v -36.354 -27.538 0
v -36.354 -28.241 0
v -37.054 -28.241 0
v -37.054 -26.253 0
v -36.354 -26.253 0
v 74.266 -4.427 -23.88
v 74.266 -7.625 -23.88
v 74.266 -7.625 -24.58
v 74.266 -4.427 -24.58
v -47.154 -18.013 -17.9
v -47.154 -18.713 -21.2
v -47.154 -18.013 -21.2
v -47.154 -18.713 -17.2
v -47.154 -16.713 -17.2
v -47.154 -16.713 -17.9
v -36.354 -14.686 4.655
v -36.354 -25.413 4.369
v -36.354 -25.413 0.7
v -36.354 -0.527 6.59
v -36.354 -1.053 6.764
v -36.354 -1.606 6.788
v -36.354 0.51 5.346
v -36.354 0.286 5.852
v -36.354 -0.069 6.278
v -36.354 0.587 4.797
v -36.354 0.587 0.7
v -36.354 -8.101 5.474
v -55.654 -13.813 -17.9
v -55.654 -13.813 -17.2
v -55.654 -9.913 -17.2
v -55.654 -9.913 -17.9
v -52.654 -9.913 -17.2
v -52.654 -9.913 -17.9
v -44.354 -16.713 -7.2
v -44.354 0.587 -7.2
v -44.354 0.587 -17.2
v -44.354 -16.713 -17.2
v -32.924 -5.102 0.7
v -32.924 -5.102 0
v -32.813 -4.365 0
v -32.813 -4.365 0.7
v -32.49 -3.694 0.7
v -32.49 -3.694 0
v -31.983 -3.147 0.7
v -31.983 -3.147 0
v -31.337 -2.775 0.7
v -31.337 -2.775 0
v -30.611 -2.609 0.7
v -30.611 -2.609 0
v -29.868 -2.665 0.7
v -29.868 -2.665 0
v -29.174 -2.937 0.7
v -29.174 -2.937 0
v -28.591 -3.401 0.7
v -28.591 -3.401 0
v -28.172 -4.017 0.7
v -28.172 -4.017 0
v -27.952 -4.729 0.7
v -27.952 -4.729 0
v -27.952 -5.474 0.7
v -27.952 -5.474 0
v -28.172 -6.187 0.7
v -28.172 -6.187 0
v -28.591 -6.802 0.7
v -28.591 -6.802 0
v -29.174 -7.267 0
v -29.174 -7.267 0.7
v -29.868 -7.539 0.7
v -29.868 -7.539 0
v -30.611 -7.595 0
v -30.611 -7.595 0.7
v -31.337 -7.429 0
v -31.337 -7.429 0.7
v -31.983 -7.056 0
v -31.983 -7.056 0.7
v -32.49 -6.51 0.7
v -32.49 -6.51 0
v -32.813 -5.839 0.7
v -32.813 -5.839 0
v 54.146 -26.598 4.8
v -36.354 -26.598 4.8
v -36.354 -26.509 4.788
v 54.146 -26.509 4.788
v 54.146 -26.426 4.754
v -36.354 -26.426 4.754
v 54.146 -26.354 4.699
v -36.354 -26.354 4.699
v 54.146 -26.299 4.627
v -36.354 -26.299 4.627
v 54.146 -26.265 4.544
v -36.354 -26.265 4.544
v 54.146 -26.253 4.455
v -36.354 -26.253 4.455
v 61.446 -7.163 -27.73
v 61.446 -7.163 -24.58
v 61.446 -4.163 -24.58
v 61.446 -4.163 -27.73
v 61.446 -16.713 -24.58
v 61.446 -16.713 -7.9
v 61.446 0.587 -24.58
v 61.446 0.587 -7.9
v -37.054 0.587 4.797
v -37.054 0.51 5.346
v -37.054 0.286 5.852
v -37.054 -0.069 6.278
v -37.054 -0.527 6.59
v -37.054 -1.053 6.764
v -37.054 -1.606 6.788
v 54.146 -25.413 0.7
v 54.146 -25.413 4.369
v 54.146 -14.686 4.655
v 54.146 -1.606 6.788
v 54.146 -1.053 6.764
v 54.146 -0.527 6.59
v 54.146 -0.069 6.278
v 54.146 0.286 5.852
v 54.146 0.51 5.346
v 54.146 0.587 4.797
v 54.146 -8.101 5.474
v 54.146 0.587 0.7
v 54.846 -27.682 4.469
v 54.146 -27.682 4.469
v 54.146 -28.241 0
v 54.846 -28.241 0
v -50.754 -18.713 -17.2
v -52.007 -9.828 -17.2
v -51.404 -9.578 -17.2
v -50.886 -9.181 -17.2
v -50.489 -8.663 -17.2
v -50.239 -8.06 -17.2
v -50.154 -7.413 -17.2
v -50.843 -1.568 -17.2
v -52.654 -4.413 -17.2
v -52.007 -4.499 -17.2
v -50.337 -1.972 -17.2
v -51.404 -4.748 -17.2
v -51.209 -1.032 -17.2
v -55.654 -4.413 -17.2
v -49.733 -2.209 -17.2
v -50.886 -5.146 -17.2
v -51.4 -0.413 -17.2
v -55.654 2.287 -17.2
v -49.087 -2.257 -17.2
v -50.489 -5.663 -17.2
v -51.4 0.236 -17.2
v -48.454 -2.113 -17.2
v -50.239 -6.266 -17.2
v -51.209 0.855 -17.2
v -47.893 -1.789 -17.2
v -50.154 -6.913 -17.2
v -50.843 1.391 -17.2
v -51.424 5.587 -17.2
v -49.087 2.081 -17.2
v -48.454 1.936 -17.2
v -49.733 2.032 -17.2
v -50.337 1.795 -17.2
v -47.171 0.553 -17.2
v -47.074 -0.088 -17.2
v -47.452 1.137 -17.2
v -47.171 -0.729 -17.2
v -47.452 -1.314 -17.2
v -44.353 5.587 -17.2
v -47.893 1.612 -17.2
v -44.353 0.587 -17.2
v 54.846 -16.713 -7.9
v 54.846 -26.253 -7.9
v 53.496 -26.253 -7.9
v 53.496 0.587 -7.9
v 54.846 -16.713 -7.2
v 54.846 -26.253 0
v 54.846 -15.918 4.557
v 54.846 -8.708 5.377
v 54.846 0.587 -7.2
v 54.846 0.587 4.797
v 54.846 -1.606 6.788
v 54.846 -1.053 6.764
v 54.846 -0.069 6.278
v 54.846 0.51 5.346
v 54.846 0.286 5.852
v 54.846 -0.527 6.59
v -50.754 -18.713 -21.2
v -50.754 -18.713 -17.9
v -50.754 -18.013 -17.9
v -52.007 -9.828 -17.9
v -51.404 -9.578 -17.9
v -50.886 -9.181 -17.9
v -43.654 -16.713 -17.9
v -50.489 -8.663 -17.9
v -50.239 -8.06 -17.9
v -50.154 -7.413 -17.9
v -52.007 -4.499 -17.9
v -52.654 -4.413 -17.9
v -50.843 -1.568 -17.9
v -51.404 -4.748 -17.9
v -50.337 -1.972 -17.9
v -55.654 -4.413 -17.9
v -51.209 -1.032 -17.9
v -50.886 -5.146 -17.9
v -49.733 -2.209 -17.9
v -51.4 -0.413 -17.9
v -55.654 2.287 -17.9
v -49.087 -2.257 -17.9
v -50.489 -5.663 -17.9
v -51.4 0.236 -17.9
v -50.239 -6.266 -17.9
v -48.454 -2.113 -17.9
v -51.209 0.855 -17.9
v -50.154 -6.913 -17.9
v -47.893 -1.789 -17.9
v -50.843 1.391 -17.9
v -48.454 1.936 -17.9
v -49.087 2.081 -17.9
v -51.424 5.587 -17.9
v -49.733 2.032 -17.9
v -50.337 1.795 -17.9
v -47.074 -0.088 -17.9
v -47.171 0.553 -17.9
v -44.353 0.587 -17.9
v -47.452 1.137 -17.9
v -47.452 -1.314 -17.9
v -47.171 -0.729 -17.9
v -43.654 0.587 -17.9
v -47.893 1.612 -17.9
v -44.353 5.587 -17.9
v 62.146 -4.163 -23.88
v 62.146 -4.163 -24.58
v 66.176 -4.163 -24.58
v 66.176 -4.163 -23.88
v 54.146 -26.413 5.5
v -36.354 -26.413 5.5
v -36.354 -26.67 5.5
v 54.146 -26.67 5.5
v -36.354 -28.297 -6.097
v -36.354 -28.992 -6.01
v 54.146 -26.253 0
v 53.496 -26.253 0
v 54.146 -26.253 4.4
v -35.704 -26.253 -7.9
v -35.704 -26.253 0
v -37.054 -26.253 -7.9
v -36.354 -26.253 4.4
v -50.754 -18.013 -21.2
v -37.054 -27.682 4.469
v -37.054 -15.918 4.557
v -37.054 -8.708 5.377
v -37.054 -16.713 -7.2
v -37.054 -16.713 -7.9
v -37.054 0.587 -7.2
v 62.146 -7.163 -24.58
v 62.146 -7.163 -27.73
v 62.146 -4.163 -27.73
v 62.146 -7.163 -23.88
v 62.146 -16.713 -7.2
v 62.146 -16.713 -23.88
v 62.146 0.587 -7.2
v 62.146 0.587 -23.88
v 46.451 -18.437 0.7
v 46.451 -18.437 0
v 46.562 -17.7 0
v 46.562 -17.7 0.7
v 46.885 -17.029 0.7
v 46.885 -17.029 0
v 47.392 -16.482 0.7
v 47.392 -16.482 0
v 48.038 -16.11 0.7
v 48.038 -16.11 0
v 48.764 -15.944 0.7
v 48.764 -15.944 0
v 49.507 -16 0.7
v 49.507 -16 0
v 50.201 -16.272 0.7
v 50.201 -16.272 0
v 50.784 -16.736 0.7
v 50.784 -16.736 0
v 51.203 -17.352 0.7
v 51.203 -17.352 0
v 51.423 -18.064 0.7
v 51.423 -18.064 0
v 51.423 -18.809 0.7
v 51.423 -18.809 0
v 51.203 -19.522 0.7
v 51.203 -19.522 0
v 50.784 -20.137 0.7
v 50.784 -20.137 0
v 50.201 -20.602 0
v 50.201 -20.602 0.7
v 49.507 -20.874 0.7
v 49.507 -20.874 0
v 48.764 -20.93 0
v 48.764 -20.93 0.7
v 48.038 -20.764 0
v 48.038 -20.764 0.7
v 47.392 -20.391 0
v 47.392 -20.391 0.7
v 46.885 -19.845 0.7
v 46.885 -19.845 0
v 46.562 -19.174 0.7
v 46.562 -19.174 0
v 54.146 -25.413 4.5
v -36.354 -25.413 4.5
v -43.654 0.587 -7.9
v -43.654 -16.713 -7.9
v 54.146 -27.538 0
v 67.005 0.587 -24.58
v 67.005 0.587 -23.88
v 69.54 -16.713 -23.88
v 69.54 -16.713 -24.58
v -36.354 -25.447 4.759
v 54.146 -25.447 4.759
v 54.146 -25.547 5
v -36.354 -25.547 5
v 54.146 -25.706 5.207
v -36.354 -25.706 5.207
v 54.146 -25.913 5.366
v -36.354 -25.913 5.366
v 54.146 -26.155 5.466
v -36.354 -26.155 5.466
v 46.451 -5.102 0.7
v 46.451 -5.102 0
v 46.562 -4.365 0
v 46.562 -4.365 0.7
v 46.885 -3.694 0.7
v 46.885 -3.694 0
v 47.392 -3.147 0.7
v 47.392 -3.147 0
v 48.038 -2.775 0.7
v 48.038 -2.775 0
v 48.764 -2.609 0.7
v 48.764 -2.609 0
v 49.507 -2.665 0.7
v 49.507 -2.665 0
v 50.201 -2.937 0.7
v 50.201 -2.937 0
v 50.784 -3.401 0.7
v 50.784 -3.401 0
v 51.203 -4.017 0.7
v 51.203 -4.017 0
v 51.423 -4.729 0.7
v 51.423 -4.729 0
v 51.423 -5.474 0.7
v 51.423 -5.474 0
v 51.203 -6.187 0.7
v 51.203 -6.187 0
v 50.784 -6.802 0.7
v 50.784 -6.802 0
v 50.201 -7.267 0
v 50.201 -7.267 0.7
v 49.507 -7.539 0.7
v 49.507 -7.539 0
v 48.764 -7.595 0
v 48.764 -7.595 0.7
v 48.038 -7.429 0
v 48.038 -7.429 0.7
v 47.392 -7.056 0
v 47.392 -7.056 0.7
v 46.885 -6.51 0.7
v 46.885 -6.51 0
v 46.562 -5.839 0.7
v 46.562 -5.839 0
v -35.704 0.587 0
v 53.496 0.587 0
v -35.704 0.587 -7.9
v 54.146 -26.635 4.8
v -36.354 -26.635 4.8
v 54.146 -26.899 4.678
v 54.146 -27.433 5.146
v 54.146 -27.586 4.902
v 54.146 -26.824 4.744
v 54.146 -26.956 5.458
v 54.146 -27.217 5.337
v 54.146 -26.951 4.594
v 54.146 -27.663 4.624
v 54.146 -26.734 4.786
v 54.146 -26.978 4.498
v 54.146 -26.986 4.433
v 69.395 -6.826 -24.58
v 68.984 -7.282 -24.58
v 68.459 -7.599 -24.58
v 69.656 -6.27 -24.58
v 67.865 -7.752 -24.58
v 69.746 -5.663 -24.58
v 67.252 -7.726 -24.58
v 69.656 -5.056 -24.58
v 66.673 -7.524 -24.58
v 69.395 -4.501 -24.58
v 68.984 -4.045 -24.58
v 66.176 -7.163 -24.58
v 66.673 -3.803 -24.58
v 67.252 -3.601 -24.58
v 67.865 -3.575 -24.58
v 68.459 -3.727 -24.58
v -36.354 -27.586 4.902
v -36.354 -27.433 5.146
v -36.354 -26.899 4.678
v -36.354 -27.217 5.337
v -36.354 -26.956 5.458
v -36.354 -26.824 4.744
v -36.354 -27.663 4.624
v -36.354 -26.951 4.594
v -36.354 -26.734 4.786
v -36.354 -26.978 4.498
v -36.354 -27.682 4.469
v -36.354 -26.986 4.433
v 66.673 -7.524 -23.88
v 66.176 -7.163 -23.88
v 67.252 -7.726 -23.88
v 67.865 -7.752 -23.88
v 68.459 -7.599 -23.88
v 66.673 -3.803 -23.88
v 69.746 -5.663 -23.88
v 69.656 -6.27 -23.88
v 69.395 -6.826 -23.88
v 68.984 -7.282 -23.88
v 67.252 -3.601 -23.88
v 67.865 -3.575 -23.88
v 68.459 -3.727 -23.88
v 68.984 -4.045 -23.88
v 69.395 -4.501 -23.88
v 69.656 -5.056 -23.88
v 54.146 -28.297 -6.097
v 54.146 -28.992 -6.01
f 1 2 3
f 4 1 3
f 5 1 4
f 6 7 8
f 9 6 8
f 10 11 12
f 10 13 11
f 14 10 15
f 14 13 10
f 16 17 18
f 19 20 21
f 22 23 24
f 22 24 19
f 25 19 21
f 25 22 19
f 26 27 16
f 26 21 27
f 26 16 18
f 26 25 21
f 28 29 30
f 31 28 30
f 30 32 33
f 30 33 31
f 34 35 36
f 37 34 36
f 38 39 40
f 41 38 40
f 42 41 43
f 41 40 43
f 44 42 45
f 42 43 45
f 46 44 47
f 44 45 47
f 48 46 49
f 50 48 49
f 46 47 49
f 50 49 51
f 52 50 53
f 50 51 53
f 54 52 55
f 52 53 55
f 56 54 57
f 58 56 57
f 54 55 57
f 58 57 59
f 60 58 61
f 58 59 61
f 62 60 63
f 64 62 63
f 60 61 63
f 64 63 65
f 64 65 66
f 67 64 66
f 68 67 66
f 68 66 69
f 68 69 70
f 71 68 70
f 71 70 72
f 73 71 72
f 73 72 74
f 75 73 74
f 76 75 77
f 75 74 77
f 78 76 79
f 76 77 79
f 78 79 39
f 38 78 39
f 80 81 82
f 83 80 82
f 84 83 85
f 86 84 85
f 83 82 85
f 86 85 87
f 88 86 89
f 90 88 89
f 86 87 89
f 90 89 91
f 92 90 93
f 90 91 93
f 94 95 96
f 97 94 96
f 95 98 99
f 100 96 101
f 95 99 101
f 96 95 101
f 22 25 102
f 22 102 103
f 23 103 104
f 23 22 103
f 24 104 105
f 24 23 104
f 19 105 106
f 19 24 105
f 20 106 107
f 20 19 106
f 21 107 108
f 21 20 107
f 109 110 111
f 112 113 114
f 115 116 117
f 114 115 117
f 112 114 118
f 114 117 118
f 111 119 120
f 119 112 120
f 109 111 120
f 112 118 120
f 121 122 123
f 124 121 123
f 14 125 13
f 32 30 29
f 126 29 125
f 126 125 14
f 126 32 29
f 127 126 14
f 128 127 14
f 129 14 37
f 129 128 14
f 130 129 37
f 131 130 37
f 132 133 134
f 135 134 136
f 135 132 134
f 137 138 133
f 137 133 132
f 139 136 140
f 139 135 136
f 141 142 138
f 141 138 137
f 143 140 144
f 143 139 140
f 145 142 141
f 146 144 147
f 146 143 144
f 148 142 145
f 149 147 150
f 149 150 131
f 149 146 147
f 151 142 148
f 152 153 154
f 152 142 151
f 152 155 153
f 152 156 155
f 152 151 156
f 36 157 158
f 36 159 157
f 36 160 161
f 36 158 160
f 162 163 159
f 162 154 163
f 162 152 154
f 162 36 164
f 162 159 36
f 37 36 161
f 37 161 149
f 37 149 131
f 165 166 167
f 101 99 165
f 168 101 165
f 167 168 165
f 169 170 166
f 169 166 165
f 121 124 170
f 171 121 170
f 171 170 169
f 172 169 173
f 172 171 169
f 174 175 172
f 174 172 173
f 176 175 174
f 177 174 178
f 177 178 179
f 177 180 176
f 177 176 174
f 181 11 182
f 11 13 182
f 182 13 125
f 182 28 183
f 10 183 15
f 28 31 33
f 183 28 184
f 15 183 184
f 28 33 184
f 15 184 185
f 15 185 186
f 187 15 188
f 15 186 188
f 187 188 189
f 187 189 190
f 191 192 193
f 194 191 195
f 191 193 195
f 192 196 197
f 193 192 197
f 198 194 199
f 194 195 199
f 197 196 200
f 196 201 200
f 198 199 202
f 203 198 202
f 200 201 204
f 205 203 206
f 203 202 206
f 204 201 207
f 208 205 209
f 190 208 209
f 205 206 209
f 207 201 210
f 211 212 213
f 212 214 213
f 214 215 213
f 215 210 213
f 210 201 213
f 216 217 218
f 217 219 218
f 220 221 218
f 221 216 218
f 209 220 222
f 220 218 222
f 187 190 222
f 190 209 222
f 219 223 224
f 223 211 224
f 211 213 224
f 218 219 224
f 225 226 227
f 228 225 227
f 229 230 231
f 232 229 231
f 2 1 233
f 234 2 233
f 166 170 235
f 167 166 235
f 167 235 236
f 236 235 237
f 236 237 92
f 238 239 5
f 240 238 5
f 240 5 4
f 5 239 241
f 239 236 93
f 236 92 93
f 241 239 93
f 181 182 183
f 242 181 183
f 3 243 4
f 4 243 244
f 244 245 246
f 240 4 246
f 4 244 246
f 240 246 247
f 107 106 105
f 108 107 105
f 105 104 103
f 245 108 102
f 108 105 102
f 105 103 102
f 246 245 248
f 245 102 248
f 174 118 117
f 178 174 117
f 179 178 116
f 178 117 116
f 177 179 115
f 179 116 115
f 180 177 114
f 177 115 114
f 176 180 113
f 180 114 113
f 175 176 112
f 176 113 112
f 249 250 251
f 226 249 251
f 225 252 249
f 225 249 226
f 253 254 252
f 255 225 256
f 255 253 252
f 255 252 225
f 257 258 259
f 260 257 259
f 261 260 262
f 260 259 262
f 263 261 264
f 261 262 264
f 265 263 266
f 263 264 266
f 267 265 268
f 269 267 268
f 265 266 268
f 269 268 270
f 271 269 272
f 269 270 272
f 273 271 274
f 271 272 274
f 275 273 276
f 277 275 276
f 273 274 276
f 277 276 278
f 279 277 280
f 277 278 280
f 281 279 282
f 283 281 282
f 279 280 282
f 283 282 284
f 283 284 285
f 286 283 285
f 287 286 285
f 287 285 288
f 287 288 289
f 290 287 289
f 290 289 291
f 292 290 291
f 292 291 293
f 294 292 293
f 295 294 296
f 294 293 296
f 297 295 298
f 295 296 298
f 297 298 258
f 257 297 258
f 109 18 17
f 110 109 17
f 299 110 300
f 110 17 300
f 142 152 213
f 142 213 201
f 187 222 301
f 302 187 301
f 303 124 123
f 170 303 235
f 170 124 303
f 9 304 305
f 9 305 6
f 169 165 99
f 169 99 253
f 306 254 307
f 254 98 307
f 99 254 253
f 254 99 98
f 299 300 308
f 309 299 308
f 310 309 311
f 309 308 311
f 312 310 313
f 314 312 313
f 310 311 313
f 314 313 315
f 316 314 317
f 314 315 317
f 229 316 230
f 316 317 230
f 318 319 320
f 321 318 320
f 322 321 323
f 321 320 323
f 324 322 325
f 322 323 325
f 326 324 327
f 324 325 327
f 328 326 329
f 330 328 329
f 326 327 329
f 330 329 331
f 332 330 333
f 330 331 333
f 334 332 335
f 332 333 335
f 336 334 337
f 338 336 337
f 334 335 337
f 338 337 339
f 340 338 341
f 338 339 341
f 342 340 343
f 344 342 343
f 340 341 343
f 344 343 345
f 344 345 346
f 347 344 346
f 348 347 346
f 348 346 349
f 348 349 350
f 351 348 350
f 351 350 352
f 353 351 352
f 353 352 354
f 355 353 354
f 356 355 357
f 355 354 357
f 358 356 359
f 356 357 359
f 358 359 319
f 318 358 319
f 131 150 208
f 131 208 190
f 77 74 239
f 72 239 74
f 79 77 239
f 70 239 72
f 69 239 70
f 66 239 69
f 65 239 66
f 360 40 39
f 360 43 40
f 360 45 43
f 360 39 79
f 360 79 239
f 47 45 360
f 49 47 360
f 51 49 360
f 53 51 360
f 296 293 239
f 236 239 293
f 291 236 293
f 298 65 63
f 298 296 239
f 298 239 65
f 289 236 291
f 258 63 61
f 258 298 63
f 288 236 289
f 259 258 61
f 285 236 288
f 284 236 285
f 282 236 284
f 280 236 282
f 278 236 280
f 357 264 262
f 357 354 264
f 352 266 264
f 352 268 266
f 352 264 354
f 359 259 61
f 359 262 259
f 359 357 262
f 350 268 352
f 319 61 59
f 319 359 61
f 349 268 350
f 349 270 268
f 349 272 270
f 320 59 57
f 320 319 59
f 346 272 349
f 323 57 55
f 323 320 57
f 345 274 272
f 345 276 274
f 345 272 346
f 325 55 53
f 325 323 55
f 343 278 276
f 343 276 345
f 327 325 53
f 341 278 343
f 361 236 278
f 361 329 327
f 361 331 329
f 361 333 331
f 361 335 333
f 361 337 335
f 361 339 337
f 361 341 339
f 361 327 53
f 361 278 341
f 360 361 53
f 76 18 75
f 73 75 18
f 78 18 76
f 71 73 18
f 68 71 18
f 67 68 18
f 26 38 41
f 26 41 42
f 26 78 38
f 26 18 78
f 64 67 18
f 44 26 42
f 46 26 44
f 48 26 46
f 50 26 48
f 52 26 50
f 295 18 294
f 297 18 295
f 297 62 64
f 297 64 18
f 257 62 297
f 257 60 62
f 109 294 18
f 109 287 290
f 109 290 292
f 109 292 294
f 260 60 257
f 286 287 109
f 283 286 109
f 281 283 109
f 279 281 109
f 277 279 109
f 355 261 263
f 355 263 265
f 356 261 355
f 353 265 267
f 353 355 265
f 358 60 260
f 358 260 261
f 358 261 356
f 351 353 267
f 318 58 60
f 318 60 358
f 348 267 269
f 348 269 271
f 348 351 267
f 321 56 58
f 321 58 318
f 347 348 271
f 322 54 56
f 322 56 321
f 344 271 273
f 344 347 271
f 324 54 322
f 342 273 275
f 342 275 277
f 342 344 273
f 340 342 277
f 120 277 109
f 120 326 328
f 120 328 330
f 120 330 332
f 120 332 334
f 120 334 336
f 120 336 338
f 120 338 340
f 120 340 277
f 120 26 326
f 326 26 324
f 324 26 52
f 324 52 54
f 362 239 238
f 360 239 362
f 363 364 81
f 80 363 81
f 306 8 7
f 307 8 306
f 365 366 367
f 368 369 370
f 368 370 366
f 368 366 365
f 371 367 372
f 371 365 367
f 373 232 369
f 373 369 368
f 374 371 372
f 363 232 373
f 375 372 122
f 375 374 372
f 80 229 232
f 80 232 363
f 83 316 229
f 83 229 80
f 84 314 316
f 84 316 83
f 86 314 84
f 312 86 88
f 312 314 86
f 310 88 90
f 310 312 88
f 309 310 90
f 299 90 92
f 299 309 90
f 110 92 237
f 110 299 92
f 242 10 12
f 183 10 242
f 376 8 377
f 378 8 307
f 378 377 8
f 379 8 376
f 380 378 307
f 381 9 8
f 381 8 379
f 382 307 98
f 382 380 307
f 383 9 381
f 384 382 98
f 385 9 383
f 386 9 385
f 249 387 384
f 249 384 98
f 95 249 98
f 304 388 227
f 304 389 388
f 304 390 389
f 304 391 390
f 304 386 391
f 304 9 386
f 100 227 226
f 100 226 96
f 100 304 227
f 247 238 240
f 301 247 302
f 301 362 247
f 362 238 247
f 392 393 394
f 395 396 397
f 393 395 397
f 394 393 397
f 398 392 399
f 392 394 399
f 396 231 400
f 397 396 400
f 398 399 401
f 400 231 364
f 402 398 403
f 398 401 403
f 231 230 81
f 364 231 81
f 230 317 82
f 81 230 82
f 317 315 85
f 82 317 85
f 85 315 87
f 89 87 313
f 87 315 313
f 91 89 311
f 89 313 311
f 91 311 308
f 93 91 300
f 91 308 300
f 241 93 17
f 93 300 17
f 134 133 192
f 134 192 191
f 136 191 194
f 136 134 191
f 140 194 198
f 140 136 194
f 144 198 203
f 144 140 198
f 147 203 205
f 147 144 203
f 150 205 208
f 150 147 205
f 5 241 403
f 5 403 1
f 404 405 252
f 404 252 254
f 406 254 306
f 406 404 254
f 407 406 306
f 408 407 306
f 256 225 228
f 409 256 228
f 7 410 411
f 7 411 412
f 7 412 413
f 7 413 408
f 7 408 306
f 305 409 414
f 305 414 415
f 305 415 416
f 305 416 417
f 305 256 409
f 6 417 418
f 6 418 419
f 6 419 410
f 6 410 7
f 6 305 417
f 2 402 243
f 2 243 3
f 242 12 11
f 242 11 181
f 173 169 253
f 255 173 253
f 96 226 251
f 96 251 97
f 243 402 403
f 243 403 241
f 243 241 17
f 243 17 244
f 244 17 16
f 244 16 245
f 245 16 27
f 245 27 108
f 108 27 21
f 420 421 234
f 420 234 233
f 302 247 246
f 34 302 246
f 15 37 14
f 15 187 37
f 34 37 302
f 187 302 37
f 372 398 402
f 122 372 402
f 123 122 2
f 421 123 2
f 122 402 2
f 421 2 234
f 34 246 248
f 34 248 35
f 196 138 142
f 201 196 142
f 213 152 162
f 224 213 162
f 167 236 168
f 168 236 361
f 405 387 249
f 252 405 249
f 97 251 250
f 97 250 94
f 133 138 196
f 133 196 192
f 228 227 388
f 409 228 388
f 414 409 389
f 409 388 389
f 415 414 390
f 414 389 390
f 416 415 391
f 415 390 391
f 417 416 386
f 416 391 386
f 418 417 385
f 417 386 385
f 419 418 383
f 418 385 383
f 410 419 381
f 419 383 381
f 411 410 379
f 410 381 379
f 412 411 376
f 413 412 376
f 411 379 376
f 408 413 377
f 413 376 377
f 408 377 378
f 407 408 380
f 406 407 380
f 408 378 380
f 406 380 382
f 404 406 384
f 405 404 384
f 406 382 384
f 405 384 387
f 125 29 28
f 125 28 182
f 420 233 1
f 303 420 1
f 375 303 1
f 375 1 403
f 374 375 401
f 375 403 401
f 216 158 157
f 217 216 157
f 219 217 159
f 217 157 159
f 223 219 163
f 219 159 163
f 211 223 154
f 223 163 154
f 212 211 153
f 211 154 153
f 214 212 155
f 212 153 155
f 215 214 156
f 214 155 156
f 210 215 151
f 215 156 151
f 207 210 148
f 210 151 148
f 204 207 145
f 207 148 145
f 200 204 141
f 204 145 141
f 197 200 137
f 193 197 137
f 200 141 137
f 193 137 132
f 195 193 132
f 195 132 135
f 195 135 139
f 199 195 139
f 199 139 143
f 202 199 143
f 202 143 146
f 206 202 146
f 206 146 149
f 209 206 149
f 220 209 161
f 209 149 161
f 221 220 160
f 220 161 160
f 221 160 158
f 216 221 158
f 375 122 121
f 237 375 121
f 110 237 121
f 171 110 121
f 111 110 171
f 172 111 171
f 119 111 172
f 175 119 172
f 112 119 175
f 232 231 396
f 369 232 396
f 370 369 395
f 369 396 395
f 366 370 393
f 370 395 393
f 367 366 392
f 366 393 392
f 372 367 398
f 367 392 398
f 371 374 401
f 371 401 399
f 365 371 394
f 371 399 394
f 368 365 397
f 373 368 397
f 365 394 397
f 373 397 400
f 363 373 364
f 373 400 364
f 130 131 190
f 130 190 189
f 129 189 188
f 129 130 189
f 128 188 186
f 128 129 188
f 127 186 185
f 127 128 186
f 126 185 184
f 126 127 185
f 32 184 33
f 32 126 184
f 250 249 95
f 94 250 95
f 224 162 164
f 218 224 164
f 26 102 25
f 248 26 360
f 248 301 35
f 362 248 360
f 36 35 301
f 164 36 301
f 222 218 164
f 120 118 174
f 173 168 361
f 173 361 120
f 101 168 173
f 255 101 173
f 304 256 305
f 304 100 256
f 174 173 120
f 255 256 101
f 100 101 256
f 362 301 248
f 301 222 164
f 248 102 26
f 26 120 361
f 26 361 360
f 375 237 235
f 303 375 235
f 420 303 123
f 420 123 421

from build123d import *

# Parameters (mm, degrees)
SZKIC1_W                     = 90.5
SZKIC1_H                     = 26
DODANIE_WYCI_GNI_CIE1_DEPTH  = 0.7
DODANIE_WYCI_GNI_CIE2_DEPTH  = 90.5
DODANIE_WYCI_GNI_CIE3_DEPTH  = 0.7
DODANIE_WYCI_GNI_CIE4_DEPTH  = 0.7
SZKIC9_W                     = 1.35
SZKIC9_H                     = 26.839634362
DODANIE_WYCI_GNI_CIE5_DEPTH  = 7.9
DODANIE_WYCI_GNI_CIE6_DEPTH  = 17.3
DODANIE_WYCI_GNI_CIE7_DEPTH  = 17.3
WYTNIJ_WYCI_GNI_CIE1_START   = -0.7
WYTNIJ_WYCI_GNI_CIE1_DEPTH   = 0.7
SZKIC14_W                    = 0.7
SZKIC14_H                    = 3
DODANIE_WYCI_GNI_CIE8_DEPTH  = 3.15
DODANIE_WYCI_GNI_CIE9_DEPTH  = 0.7
SZKIC18_R                    = 2.175
WYTNIJ_WYCI_GNI_CIE2_DEPTH   = 0.7
SZKIC19_W                    = 8.5
SZKIC19_H                    = 2
DODANIE_WYCI_GNI_CIE10_DEPTH = 0.7
WYTNIJ_WYCI_GNI_CIE3_DEPTH   = 0.7
SZKIC22_W                    = 3.6
SZKIC22_H                    = 0.7
DODANIE_WYCI_GNI_CIE11_DEPTH = 3.3
SZKIC23_R                    = 2.5
WYTNIJ_WYCI_GNI_CIE4_DEPTH   = 0.7


with BuildPart() as part:
    # Szkic1 → Dodanie-wyciągnięcie1 (new body)
    with BuildSketch(Plane.XY):
        with Locations((8.895925444, -12.413393351)):
            Rectangle(SZKIC1_W, SZKIC1_H)
    extrude(amount=DODANIE_WYCI_GNI_CIE1_DEPTH)



with BuildPart() as body_2:
    # Szkic3 → Dodanie-wyciągnięcie2 (new body)
    with BuildSketch(Plane.ZY.offset(36.354074556)):
        with BuildLine():
            Line((5.5, -26.413393351), (5.5, -26.670245495))
            ThreePointArc((5.5, -26.670245495), (5.249678176, -27.332048058), (4.624034735, -27.662523372))
            Line((4.624034735, -27.662523372), (-6.01042337, -28.991830635))
            Line((-6.01042337, -28.991830635), (-6.097247684, -28.297236121))
            Line((-6.097247684, -28.297236121), (4.497633639, -26.977852669))
            ThreePointArc((4.497633639, -26.977852669), (4.713586161, -26.863878738), (4.8, -26.635497046))
            Line((4.8, -26.635497046), (4.8, -26.598027713))
            ThreePointArc((4.8, -26.598027713), (4.69895184, -26.354075874), (4.455, -26.253027713))
            Line((4.455, -26.253027713), (0, -26.253027713))
            Line((0, -26.253027713), (0, -25.413393351))
            Line((0, -25.413393351), (4.5, -25.413393351))
            ThreePointArc((4.5, -25.413393351), (5.207106781, -25.706286569), (5.5, -26.413393351))
        make_face()
    extrude(amount=-DODANIE_WYCI_GNI_CIE2_DEPTH)


with BuildPart() as part_1:
    add(part.part)

    add(body_2.part)  # Dodanie-wyciągnięcie3 merges body 2
    # Szkic4 → Dodanie-wyciągnięcie3 (add)
    with BuildSketch(Plane(origin=(54.145925444, 0, 0), x_dir=(0, 0, -1), z_dir=(1, 0, 0))):
        with BuildLine():
            Line((0, 0.586606649), (-4.796894469, 0.586606649))
            ThreePointArc((-4.796894469, 0.586606649), (-6.277718772, -0.069087068), (-6.787575884, -1.606233969))
            add(Edge.make_bspline(
                [(-4.469267418, -27.681869286), (-4.44254495, -27.204916247), (-4.010367743, -18.290006756), (-4.851145038, -9.610716303), (-6.787575884, -1.606233969)],
                knots=[-0.045928805, -0.045928805, -0.045928805, -0.045928805, 0, 0.813756029, 0.813756029, 0.813756029, 0.813756029], degree=3))
            Line((-4.469267418, -27.681869286), (0, -28.240527713))
            Line((0, -28.240527713), (0, 0.586606649))
        make_face()
    extrude(amount=DODANIE_WYCI_GNI_CIE3_DEPTH)

    # Szkic8 → Dodanie-wyciągnięcie4 (add)
    with BuildSketch(Plane.ZY.offset(36.354074556)):
        with BuildLine():
            Line((4.469267418, -27.681869286), (0, -28.240527713))
            Line((0, -28.240527713), (0, 0.586606649))
            Line((0, 0.586606649), (4.796894469, 0.586606649))
            ThreePointArc((4.796894469, 0.586606649), (6.277718772, -0.069087068), (6.787575884, -1.606233969))
            add(Edge.make_bspline(
                [(4.469267418, -27.681869286), (4.44254495, -27.204916247), (4.010367743, -18.290006756), (4.851145038, -9.610716303), (6.787575884, -1.606233969)],
                knots=[-0.045928805, -0.045928805, -0.045928805, -0.045928805, 0, 0.813756029, 0.813756029, 0.813756029, 0.813756029], degree=3))
        make_face()
    extrude(amount=DODANIE_WYCI_GNI_CIE4_DEPTH)

    # Szkic9 → Dodanie-wyciągnięcie5 (add)
    with BuildSketch(Plane(origin=(0, 0, 0), x_dir=(-1, 0, 0), z_dir=(0, 0, -1))):
        with Locations((-54.170925444, -12.833210532)):
            Rectangle(SZKIC9_W, SZKIC9_H)
        with Locations((36.379074556, -12.833210532)):
            Rectangle(SZKIC9_W, SZKIC9_H)
    extrude(amount=DODANIE_WYCI_GNI_CIE5_DEPTH)

    # Szkic11 → Dodanie-wyciągnięcie6 (add)
    with BuildSketch(Plane(origin=(0, 0.586606649, 0), x_dir=(1, 0, 0), z_dir=(0, 1, 0))):
        Polygon((-37.054074556, 7.9), (-37.054074556, 7.2), (-44.354074556, 7.2), (-44.354074556, 17.2), (-55.654074556, 17.2), (-55.654074556, 17.9), (-43.654074556, 17.9), (-43.654074556, 7.9), align=None)
    extrude(amount=-DODANIE_WYCI_GNI_CIE6_DEPTH)

    # Szkic12 → Dodanie-wyciągnięcie7 (add)
    with BuildSketch(Plane(origin=(0, 0.586606649, 0), x_dir=(1, 0, 0), z_dir=(0, 1, 0))):
        Polygon((54.845925444, 7.9), (54.845925444, 7.2), (62.145925444, 7.2), (62.145925444, 23.88), (74.265925444, 23.88), (74.265925444, 24.58), (61.445925444, 24.58), (61.445925444, 7.9), align=None)
    extrude(amount=-DODANIE_WYCI_GNI_CIE7_DEPTH)

    # Szkic13 → Wytnij-wyciągnięcie1 (cut)
    with BuildSketch(Plane.XY.offset(-23.88).offset(WYTNIJ_WYCI_GNI_CIE1_START)):
        Polygon((67.004736449, 0.586606649), (75.489507901, -5.272079996), (69.539548838, -16.713393351), (76.249870064, -16.713393351), (76.249870064, 0.586606649), align=None)
        with BuildLine():
            Line((62.145925444, -4.163393351), (66.176231598, -4.163393351))
            ThreePointArc((66.176231598, -4.163393351), (69.745925444, -5.663393351), (66.176231598, -7.163393351))
            Line((66.176231598, -7.163393351), (62.145925444, -7.163393351))
            Line((62.145925444, -7.163393351), (62.145925444, -4.163393351))
        make_face()
    extrude(amount=WYTNIJ_WYCI_GNI_CIE1_DEPTH, mode=Mode.SUBTRACT)

    # Szkic14 → Dodanie-wyciągnięcie8 (add)
    with BuildSketch(Plane(origin=(0, 0, -24.58), x_dir=(-1, 0, 0), z_dir=(0, 0, -1))):
        with Locations((-61.795925444, -5.663393351)):
            Rectangle(SZKIC14_W, SZKIC14_H)
    extrude(amount=DODANIE_WYCI_GNI_CIE8_DEPTH)

    # Szkic17 → Dodanie-wyciągnięcie9 (add)
    with BuildSketch(Plane.XY.offset(-17.2)):
        Polygon((-44.353275943, 0.54213061), (-55.654074556, 0.586606649), (-55.654074556, 5.586606649), (-44.353275943, 5.586606649), align=None)
    extrude(amount=-DODANIE_WYCI_GNI_CIE9_DEPTH)

    # Szkic18 → Wytnij-wyciągnięcie2 (cut)
    with BuildSketch(Plane.XY.offset(-17.2)):
        with Locations((-49.249074556, -0.088393351)):
            Circle(SZKIC18_R)
        Polygon((-51.424074556, 5.586606649), (-55.654074556, 2.286606649), (-55.654074556, 5.586606649), align=None)
        with BuildLine():
            Line((-55.654074556, -4.413393351), (-52.654074556, -4.413393351))
            ThreePointArc((-52.654074556, -4.413393351), (-50.886307603, -5.145626398), (-50.154074556, -6.913393351))
            Line((-50.154074556, -6.913393351), (-50.154074556, -7.413393351))
            ThreePointArc((-50.154074556, -7.413393351), (-50.886307603, -9.181160304), (-52.654074556, -9.913393351))
            Line((-52.654074556, -9.913393351), (-55.654074556, -9.913393351))
            Line((-55.654074556, -9.913393351), (-55.654074556, -4.413393351))
        make_face()
    extrude(amount=-WYTNIJ_WYCI_GNI_CIE2_DEPTH, mode=Mode.SUBTRACT)

    # Szkic19 → Dodanie-wyciągnięcie10 (add)
    with BuildSketch(Plane.XY.offset(-17.2)):
        with Locations((-51.404074556, -17.713393351)):
            Rectangle(SZKIC19_W, SZKIC19_H)
    extrude(amount=-DODANIE_WYCI_GNI_CIE10_DEPTH)

    # Szkic21 → Wytnij-wyciągnięcie3 (cut)
    with BuildSketch(Plane.XY.offset(-17.2)):
        Polygon((-55.654074556, -13.813393351), (-50.754074556, -18.713393351), (-55.654074556, -18.713393351), align=None)
    extrude(amount=-WYTNIJ_WYCI_GNI_CIE3_DEPTH, mode=Mode.SUBTRACT)

    # Szkic22 → Dodanie-wyciągnięcie11 (add)
    with BuildSketch(Plane(origin=(0, 0, -17.9), x_dir=(-1, 0, 0), z_dir=(0, 0, -1))):
        with Locations((48.954074556, -18.363393351)):
            Rectangle(SZKIC22_W, SZKIC22_H)
    extrude(amount=DODANIE_WYCI_GNI_CIE11_DEPTH)

    # Szkic23 → Wytnij-wyciągnięcie4 (cut)
    with BuildSketch(Plane(origin=(0, 0, 0), x_dir=(-1, 0, 0), z_dir=(0, 0, -1))):
        with Locations((-48.950925444, -5.101869726)):
            Circle(SZKIC23_R)
        with Locations((30.424074556, -5.101869726)):
            Circle(SZKIC23_R)
        with Locations((-48.950925444, -18.436869726)):
            Circle(SZKIC23_R)
    extrude(amount=-WYTNIJ_WYCI_GNI_CIE4_DEPTH, mode=Mode.SUBTRACT)


solid = part_1.part
